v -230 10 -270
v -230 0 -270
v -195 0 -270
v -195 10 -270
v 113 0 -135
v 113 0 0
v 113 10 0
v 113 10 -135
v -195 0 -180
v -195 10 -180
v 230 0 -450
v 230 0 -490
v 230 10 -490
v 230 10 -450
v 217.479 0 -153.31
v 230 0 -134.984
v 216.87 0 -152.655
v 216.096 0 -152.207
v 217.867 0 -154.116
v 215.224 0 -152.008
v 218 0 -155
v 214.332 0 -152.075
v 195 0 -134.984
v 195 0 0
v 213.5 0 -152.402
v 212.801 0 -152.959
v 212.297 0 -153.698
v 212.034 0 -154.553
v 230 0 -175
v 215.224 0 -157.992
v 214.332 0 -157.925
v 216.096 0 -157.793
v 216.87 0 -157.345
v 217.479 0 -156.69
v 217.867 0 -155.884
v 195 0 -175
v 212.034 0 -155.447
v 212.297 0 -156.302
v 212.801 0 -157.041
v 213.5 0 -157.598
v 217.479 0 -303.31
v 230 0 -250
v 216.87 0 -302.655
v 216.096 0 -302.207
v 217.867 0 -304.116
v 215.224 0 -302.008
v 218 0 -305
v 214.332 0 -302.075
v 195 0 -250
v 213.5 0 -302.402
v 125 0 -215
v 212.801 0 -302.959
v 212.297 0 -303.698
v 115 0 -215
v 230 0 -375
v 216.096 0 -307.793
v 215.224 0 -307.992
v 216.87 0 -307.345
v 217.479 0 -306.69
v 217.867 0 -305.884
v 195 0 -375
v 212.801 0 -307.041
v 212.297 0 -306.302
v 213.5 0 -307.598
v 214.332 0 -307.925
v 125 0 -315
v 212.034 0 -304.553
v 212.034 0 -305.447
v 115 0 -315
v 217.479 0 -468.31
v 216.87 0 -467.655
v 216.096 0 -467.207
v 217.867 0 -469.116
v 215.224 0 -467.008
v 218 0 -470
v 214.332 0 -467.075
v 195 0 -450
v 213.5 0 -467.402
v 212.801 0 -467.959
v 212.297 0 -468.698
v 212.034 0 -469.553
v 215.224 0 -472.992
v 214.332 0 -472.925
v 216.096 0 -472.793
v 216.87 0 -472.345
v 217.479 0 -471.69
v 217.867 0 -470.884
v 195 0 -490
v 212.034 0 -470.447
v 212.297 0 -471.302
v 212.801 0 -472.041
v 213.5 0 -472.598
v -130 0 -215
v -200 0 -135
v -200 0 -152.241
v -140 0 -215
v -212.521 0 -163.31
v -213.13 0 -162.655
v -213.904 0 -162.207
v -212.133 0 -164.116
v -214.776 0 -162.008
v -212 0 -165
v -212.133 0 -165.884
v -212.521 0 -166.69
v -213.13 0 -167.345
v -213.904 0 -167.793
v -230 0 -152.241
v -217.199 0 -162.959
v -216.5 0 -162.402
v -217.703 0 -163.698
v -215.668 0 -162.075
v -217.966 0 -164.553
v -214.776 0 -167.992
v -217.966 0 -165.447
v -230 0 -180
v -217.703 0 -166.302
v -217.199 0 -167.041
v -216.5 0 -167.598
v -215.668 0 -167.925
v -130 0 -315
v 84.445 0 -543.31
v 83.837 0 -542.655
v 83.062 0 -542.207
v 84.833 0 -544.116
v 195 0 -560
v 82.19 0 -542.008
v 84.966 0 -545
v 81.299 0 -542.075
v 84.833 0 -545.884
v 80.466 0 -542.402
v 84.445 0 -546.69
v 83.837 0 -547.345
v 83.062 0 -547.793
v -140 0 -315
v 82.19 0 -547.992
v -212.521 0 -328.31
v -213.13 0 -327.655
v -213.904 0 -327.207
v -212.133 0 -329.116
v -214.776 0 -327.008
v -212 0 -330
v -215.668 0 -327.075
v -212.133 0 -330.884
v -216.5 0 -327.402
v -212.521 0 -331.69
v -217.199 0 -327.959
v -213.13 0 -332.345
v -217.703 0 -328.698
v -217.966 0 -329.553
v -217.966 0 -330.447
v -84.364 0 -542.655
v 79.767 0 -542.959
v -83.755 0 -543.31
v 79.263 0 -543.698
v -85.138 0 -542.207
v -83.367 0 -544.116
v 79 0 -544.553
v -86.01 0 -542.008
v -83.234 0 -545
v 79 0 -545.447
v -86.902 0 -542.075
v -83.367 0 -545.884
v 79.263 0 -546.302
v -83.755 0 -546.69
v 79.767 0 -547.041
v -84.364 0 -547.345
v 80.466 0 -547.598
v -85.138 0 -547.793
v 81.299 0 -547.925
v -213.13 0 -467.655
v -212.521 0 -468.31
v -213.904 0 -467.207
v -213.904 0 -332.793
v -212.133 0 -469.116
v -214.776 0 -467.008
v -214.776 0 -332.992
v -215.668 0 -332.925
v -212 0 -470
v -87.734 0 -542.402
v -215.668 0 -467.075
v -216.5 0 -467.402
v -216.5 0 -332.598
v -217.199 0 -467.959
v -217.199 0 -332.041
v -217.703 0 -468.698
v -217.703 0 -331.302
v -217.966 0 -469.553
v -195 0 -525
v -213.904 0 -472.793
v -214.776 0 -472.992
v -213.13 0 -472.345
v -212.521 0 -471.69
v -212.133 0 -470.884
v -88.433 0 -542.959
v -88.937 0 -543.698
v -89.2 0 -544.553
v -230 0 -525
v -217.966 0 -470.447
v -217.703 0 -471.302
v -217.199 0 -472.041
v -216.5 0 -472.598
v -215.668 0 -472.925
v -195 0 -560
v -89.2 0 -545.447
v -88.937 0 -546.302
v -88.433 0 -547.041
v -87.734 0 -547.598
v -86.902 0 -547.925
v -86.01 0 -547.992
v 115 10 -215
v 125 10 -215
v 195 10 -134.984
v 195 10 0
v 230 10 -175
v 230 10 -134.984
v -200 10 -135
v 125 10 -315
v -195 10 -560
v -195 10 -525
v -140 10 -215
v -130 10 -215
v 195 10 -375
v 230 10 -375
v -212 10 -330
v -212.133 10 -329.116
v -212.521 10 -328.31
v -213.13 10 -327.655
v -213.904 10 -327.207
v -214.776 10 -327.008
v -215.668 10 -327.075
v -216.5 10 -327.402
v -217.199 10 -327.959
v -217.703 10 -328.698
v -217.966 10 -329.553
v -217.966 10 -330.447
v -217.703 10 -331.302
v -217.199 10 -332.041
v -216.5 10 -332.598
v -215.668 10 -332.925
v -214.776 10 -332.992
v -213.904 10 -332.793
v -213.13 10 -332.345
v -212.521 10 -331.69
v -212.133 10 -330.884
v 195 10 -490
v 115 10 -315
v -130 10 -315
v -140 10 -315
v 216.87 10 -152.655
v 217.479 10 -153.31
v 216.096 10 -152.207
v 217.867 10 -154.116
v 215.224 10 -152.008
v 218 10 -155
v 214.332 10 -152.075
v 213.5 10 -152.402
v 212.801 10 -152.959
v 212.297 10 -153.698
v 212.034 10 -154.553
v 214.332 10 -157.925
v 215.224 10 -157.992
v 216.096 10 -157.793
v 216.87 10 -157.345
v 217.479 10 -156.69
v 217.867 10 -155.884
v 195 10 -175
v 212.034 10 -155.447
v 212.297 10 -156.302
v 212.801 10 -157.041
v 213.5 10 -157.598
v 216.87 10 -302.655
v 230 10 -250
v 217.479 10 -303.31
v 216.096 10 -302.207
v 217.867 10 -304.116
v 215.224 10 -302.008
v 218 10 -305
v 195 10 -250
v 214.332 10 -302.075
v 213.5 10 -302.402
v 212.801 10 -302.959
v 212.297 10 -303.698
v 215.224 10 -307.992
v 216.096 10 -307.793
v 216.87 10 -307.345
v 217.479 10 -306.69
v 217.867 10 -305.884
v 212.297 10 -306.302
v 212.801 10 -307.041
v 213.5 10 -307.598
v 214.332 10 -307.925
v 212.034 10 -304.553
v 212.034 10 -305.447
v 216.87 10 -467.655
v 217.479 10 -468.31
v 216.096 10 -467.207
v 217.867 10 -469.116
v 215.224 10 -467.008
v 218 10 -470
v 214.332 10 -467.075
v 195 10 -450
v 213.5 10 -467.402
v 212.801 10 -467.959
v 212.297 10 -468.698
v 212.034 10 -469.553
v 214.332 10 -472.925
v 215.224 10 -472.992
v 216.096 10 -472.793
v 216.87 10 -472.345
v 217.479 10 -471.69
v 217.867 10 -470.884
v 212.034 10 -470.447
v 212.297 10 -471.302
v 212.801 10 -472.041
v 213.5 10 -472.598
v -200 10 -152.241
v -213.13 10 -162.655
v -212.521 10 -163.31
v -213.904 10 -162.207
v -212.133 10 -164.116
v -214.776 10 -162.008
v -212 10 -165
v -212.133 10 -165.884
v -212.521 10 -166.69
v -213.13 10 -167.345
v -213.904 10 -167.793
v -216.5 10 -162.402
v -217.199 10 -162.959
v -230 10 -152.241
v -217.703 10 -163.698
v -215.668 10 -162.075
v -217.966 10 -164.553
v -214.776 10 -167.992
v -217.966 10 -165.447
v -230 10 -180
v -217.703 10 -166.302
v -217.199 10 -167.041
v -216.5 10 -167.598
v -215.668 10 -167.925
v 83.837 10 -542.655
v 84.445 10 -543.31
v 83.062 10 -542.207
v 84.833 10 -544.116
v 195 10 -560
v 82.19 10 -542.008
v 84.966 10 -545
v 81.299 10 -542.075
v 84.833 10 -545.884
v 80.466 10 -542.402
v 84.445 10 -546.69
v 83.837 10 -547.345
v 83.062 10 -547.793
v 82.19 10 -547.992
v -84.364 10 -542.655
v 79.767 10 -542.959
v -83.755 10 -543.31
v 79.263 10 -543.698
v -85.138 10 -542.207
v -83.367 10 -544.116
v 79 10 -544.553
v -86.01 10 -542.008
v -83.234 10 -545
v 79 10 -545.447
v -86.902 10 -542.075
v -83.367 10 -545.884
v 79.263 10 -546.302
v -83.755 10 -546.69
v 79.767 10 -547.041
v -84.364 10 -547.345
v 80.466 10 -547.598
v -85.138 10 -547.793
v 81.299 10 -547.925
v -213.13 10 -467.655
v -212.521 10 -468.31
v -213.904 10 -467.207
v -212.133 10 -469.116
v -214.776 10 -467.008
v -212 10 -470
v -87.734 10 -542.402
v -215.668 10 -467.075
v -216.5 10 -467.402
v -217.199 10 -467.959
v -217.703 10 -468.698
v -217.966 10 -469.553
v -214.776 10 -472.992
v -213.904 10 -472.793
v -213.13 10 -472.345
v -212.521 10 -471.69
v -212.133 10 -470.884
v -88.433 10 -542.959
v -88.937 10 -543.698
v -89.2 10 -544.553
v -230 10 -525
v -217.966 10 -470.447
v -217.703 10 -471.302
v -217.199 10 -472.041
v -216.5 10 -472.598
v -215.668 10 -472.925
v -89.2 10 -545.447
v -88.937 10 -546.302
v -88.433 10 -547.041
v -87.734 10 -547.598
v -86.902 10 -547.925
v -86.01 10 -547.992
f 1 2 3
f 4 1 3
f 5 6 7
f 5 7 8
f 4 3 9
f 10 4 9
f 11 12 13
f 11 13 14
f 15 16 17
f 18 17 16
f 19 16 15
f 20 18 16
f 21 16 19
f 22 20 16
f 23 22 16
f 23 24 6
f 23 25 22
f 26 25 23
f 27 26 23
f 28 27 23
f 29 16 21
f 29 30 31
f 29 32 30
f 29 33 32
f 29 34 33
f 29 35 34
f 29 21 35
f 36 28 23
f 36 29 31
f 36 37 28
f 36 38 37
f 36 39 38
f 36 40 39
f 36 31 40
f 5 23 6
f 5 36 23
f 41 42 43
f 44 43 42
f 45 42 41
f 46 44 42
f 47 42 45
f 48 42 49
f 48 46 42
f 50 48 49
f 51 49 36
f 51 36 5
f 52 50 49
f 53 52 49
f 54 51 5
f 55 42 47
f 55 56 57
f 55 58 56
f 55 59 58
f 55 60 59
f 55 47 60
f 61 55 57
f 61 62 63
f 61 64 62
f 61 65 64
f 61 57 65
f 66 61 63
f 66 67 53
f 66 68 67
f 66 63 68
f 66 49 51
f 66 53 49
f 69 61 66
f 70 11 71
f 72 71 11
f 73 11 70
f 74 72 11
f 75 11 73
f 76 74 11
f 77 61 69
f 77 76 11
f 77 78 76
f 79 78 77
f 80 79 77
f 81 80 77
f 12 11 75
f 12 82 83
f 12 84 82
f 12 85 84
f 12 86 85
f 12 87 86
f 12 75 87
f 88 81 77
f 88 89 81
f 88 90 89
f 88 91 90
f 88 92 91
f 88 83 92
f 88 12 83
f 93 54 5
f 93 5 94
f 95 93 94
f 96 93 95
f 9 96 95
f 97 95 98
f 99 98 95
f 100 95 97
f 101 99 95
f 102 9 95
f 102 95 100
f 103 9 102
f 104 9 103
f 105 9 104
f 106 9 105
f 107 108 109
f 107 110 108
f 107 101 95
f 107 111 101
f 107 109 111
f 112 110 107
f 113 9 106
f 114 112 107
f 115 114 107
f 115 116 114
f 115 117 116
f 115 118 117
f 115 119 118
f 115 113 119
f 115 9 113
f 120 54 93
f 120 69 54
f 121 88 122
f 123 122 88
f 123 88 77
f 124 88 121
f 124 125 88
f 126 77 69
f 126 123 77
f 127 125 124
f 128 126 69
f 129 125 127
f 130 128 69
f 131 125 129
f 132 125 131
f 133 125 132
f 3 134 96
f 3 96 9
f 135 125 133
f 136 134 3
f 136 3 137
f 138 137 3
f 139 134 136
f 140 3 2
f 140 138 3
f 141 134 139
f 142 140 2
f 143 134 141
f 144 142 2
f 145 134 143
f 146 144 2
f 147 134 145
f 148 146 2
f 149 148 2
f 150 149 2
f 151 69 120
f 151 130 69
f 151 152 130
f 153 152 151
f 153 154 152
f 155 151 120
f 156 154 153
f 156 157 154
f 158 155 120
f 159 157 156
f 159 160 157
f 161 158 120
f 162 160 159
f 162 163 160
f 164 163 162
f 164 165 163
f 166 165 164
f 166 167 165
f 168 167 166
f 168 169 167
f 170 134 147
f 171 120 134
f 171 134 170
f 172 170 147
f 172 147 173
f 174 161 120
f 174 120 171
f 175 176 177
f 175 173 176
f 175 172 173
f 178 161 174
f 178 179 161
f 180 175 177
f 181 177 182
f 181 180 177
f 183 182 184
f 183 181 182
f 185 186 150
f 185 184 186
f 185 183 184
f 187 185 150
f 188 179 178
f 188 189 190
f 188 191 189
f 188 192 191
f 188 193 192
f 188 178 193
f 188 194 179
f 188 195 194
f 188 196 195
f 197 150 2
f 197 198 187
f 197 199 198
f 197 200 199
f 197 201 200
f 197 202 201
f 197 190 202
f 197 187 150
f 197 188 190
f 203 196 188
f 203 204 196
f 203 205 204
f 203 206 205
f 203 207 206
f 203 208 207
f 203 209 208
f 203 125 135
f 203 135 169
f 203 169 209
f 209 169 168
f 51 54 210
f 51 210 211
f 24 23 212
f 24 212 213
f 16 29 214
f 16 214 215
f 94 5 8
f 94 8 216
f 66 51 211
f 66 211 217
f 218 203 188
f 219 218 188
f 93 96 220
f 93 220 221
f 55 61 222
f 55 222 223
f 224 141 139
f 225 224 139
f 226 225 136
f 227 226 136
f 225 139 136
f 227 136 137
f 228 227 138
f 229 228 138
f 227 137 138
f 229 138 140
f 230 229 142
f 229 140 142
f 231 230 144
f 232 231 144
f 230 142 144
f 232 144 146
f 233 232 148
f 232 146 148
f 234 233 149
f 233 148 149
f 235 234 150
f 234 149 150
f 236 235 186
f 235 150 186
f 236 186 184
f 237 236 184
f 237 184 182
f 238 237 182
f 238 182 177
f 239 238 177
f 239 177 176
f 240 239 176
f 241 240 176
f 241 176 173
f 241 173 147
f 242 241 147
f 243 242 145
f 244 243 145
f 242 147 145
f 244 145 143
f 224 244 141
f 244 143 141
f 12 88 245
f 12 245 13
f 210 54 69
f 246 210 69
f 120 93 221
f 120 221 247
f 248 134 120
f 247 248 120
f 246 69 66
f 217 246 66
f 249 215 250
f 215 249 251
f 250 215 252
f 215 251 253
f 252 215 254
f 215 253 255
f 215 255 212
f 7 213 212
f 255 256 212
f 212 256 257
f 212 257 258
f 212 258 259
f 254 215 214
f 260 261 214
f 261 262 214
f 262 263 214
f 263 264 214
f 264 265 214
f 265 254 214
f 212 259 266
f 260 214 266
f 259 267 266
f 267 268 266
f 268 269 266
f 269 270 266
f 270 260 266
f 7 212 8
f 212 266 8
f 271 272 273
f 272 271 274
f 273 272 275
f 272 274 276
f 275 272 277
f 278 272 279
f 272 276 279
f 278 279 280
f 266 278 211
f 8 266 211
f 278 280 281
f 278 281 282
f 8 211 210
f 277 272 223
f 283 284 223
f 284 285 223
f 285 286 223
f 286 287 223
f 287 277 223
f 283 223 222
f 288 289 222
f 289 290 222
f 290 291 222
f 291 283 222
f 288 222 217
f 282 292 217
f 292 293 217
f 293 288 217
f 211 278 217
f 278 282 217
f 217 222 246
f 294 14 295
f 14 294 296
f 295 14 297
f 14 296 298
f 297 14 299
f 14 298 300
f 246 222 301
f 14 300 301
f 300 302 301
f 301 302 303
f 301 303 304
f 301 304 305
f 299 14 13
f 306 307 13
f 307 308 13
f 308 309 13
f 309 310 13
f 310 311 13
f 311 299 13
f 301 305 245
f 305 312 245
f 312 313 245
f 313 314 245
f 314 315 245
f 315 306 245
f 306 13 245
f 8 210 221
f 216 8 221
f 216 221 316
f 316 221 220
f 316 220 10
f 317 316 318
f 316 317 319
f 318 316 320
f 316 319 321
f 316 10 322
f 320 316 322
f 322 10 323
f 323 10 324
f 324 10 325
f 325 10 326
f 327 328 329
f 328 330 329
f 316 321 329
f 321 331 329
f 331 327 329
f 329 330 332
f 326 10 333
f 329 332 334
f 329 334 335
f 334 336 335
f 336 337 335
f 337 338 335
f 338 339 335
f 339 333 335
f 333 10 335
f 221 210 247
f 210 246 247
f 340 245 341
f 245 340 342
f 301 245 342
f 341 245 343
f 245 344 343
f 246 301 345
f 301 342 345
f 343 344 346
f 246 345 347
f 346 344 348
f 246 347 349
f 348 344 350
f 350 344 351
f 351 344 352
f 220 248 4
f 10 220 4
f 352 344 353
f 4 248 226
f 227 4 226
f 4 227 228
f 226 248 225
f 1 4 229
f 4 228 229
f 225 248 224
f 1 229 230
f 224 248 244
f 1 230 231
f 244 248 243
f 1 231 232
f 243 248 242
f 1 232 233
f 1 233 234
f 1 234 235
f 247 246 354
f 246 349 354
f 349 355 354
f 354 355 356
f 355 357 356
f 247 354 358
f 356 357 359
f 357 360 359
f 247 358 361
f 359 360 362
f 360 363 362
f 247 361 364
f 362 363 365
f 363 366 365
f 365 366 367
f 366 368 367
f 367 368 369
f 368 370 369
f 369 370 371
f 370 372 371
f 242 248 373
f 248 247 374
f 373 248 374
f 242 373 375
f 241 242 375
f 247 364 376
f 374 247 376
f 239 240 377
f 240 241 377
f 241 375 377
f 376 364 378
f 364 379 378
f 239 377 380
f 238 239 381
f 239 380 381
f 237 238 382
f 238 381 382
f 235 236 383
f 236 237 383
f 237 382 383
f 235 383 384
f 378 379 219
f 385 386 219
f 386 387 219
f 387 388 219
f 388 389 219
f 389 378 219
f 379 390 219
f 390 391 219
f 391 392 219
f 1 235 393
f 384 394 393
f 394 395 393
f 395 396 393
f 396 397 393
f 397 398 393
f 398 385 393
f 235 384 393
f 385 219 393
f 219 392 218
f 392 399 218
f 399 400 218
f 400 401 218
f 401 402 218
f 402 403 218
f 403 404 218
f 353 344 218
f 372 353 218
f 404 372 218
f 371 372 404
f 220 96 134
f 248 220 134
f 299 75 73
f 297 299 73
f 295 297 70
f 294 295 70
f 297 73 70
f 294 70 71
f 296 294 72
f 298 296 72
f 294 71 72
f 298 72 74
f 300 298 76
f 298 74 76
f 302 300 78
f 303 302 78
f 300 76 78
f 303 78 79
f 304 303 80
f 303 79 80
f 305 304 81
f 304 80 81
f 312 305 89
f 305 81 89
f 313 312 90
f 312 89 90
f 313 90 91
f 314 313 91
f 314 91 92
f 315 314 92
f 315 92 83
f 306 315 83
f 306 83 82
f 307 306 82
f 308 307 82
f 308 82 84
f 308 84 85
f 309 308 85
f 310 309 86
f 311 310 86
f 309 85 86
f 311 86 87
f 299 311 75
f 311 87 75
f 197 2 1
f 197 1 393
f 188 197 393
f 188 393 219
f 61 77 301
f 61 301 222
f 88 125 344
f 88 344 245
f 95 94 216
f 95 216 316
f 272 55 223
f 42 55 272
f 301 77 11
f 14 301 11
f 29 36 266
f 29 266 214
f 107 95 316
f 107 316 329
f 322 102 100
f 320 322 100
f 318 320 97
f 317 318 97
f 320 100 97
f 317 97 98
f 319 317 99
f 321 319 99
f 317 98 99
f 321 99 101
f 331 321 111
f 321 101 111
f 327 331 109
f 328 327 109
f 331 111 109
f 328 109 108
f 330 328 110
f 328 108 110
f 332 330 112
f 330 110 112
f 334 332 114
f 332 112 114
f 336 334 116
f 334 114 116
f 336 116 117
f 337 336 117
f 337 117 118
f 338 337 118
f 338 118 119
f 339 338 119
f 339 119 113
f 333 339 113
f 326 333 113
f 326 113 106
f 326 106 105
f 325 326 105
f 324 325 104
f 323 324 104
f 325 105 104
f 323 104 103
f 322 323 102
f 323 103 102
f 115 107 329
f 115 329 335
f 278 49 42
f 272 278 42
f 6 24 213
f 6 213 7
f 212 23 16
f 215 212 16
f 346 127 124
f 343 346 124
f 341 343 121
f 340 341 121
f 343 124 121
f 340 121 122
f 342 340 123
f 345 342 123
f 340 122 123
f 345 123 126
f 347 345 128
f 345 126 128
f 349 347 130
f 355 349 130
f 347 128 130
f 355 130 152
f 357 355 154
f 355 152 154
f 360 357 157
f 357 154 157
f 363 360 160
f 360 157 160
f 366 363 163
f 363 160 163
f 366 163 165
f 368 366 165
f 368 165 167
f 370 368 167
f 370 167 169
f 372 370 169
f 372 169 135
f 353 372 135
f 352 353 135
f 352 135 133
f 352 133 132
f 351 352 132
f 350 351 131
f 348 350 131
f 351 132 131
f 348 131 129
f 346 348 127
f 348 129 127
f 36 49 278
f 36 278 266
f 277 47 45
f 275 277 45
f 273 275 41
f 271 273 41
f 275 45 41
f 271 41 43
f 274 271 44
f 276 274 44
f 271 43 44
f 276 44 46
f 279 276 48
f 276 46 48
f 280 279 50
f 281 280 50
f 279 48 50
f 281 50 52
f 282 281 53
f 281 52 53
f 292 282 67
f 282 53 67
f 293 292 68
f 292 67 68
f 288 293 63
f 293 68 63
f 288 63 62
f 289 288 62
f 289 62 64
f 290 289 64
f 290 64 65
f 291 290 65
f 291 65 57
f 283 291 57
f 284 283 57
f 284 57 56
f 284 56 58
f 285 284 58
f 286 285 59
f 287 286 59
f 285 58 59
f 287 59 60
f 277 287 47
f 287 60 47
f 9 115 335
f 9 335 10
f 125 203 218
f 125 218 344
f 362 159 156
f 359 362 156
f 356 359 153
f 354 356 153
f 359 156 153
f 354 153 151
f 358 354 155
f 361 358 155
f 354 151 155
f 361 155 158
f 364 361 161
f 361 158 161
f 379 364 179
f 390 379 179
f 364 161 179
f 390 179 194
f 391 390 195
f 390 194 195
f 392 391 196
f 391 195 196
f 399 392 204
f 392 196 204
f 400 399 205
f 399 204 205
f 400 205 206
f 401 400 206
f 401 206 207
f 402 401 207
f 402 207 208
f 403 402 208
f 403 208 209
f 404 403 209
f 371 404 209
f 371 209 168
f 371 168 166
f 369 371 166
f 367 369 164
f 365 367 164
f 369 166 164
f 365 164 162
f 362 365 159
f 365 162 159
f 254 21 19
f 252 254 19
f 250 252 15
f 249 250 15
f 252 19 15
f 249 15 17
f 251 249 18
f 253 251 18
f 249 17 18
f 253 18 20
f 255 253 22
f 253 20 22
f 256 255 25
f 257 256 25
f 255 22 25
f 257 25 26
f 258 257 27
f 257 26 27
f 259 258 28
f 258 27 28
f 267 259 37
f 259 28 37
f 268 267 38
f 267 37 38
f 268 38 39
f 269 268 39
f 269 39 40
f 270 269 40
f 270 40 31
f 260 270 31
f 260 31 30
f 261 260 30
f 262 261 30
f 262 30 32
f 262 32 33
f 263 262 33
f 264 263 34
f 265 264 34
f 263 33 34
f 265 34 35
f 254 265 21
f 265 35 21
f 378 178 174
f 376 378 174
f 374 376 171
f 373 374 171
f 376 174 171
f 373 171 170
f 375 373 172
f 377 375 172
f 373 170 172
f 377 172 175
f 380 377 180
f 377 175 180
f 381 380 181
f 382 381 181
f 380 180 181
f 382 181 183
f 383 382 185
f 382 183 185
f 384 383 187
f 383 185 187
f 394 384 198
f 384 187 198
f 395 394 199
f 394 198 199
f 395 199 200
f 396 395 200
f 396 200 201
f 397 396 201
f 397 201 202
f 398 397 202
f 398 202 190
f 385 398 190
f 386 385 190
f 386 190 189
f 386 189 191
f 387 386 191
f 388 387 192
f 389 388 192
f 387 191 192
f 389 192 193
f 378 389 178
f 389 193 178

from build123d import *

# Parameters (mm, degrees)
SKETCH1_W           = 10
SKETCH1_H           = 100
BOSS_EXTRUDE1_DEPTH = 10
SKETCH2_R           = 3
SKETCH2_W           = 35
SKETCH2_H           = 70
SKETCH2_H_2         = 35
SKETCH2_H_3         = 90
SKETCH2_H_4         = 134.983592253
SKETCH2_H_5         = 75
CUT_EXTRUDE1_DEPTH  = 10


with BuildPart() as part:
    # Sketch1 → Boss-Extrude1 (new body)
    with BuildSketch(Plane(origin=(0, 0, 0), x_dir=(1, 0, 0), z_dir=(0, 1, 0))):
        Polygon((230, 560), (230, 0), (113, 0), (113, 135), (-200, 135), (-200, 152.241186389), (-230, 152.241186389), (-230, 560), align=None)
        with Locations((120, 265)):
            Rectangle(SKETCH1_W, SKETCH1_H, mode=Mode.SUBTRACT)
        with Locations((-135, 265)):
            Rectangle(SKETCH1_W, SKETCH1_H, mode=Mode.SUBTRACT)
    extrude(amount=BOSS_EXTRUDE1_DEPTH)

    # Sketch2 → Cut-Extrude1 (cut)
    with BuildSketch(Plane.XZ):
        with Locations((215, -470)):
            Circle(SKETCH2_R)
        with Locations((215, -155)):
            Circle(SKETCH2_R)
        with Locations((215, -305)):
            Circle(SKETCH2_R)
        with Locations((-215, -165)):
            Circle(SKETCH2_R)
        with Locations((-215, -470)):
            Circle(SKETCH2_R)
        with Locations((-215, -330)):
            Circle(SKETCH2_R)
        with Locations((81.96618504, -545)):
            Circle(SKETCH2_R)
        with Locations((-86.233971822, -545)):
            Circle(SKETCH2_R)
        with Locations((212.5, -525)):
            Rectangle(SKETCH2_W, SKETCH2_H)
        with Locations((-212.5, -542.5)):
            Rectangle(SKETCH2_W, SKETCH2_H_2)
        with Locations((-212.5, -225)):
            Rectangle(SKETCH2_W, SKETCH2_H_3)
        with Locations((212.5, -67.491796127)):
            Rectangle(SKETCH2_W, SKETCH2_H_4)
        with Locations((212.5, -212.5)):
            Rectangle(SKETCH2_W, SKETCH2_H_5)
        with Locations((212.5, -412.5)):
            Rectangle(SKETCH2_W, SKETCH2_H_5)
    extrude(amount=-CUT_EXTRUDE1_DEPTH, mode=Mode.SUBTRACT)


solid = part.part
